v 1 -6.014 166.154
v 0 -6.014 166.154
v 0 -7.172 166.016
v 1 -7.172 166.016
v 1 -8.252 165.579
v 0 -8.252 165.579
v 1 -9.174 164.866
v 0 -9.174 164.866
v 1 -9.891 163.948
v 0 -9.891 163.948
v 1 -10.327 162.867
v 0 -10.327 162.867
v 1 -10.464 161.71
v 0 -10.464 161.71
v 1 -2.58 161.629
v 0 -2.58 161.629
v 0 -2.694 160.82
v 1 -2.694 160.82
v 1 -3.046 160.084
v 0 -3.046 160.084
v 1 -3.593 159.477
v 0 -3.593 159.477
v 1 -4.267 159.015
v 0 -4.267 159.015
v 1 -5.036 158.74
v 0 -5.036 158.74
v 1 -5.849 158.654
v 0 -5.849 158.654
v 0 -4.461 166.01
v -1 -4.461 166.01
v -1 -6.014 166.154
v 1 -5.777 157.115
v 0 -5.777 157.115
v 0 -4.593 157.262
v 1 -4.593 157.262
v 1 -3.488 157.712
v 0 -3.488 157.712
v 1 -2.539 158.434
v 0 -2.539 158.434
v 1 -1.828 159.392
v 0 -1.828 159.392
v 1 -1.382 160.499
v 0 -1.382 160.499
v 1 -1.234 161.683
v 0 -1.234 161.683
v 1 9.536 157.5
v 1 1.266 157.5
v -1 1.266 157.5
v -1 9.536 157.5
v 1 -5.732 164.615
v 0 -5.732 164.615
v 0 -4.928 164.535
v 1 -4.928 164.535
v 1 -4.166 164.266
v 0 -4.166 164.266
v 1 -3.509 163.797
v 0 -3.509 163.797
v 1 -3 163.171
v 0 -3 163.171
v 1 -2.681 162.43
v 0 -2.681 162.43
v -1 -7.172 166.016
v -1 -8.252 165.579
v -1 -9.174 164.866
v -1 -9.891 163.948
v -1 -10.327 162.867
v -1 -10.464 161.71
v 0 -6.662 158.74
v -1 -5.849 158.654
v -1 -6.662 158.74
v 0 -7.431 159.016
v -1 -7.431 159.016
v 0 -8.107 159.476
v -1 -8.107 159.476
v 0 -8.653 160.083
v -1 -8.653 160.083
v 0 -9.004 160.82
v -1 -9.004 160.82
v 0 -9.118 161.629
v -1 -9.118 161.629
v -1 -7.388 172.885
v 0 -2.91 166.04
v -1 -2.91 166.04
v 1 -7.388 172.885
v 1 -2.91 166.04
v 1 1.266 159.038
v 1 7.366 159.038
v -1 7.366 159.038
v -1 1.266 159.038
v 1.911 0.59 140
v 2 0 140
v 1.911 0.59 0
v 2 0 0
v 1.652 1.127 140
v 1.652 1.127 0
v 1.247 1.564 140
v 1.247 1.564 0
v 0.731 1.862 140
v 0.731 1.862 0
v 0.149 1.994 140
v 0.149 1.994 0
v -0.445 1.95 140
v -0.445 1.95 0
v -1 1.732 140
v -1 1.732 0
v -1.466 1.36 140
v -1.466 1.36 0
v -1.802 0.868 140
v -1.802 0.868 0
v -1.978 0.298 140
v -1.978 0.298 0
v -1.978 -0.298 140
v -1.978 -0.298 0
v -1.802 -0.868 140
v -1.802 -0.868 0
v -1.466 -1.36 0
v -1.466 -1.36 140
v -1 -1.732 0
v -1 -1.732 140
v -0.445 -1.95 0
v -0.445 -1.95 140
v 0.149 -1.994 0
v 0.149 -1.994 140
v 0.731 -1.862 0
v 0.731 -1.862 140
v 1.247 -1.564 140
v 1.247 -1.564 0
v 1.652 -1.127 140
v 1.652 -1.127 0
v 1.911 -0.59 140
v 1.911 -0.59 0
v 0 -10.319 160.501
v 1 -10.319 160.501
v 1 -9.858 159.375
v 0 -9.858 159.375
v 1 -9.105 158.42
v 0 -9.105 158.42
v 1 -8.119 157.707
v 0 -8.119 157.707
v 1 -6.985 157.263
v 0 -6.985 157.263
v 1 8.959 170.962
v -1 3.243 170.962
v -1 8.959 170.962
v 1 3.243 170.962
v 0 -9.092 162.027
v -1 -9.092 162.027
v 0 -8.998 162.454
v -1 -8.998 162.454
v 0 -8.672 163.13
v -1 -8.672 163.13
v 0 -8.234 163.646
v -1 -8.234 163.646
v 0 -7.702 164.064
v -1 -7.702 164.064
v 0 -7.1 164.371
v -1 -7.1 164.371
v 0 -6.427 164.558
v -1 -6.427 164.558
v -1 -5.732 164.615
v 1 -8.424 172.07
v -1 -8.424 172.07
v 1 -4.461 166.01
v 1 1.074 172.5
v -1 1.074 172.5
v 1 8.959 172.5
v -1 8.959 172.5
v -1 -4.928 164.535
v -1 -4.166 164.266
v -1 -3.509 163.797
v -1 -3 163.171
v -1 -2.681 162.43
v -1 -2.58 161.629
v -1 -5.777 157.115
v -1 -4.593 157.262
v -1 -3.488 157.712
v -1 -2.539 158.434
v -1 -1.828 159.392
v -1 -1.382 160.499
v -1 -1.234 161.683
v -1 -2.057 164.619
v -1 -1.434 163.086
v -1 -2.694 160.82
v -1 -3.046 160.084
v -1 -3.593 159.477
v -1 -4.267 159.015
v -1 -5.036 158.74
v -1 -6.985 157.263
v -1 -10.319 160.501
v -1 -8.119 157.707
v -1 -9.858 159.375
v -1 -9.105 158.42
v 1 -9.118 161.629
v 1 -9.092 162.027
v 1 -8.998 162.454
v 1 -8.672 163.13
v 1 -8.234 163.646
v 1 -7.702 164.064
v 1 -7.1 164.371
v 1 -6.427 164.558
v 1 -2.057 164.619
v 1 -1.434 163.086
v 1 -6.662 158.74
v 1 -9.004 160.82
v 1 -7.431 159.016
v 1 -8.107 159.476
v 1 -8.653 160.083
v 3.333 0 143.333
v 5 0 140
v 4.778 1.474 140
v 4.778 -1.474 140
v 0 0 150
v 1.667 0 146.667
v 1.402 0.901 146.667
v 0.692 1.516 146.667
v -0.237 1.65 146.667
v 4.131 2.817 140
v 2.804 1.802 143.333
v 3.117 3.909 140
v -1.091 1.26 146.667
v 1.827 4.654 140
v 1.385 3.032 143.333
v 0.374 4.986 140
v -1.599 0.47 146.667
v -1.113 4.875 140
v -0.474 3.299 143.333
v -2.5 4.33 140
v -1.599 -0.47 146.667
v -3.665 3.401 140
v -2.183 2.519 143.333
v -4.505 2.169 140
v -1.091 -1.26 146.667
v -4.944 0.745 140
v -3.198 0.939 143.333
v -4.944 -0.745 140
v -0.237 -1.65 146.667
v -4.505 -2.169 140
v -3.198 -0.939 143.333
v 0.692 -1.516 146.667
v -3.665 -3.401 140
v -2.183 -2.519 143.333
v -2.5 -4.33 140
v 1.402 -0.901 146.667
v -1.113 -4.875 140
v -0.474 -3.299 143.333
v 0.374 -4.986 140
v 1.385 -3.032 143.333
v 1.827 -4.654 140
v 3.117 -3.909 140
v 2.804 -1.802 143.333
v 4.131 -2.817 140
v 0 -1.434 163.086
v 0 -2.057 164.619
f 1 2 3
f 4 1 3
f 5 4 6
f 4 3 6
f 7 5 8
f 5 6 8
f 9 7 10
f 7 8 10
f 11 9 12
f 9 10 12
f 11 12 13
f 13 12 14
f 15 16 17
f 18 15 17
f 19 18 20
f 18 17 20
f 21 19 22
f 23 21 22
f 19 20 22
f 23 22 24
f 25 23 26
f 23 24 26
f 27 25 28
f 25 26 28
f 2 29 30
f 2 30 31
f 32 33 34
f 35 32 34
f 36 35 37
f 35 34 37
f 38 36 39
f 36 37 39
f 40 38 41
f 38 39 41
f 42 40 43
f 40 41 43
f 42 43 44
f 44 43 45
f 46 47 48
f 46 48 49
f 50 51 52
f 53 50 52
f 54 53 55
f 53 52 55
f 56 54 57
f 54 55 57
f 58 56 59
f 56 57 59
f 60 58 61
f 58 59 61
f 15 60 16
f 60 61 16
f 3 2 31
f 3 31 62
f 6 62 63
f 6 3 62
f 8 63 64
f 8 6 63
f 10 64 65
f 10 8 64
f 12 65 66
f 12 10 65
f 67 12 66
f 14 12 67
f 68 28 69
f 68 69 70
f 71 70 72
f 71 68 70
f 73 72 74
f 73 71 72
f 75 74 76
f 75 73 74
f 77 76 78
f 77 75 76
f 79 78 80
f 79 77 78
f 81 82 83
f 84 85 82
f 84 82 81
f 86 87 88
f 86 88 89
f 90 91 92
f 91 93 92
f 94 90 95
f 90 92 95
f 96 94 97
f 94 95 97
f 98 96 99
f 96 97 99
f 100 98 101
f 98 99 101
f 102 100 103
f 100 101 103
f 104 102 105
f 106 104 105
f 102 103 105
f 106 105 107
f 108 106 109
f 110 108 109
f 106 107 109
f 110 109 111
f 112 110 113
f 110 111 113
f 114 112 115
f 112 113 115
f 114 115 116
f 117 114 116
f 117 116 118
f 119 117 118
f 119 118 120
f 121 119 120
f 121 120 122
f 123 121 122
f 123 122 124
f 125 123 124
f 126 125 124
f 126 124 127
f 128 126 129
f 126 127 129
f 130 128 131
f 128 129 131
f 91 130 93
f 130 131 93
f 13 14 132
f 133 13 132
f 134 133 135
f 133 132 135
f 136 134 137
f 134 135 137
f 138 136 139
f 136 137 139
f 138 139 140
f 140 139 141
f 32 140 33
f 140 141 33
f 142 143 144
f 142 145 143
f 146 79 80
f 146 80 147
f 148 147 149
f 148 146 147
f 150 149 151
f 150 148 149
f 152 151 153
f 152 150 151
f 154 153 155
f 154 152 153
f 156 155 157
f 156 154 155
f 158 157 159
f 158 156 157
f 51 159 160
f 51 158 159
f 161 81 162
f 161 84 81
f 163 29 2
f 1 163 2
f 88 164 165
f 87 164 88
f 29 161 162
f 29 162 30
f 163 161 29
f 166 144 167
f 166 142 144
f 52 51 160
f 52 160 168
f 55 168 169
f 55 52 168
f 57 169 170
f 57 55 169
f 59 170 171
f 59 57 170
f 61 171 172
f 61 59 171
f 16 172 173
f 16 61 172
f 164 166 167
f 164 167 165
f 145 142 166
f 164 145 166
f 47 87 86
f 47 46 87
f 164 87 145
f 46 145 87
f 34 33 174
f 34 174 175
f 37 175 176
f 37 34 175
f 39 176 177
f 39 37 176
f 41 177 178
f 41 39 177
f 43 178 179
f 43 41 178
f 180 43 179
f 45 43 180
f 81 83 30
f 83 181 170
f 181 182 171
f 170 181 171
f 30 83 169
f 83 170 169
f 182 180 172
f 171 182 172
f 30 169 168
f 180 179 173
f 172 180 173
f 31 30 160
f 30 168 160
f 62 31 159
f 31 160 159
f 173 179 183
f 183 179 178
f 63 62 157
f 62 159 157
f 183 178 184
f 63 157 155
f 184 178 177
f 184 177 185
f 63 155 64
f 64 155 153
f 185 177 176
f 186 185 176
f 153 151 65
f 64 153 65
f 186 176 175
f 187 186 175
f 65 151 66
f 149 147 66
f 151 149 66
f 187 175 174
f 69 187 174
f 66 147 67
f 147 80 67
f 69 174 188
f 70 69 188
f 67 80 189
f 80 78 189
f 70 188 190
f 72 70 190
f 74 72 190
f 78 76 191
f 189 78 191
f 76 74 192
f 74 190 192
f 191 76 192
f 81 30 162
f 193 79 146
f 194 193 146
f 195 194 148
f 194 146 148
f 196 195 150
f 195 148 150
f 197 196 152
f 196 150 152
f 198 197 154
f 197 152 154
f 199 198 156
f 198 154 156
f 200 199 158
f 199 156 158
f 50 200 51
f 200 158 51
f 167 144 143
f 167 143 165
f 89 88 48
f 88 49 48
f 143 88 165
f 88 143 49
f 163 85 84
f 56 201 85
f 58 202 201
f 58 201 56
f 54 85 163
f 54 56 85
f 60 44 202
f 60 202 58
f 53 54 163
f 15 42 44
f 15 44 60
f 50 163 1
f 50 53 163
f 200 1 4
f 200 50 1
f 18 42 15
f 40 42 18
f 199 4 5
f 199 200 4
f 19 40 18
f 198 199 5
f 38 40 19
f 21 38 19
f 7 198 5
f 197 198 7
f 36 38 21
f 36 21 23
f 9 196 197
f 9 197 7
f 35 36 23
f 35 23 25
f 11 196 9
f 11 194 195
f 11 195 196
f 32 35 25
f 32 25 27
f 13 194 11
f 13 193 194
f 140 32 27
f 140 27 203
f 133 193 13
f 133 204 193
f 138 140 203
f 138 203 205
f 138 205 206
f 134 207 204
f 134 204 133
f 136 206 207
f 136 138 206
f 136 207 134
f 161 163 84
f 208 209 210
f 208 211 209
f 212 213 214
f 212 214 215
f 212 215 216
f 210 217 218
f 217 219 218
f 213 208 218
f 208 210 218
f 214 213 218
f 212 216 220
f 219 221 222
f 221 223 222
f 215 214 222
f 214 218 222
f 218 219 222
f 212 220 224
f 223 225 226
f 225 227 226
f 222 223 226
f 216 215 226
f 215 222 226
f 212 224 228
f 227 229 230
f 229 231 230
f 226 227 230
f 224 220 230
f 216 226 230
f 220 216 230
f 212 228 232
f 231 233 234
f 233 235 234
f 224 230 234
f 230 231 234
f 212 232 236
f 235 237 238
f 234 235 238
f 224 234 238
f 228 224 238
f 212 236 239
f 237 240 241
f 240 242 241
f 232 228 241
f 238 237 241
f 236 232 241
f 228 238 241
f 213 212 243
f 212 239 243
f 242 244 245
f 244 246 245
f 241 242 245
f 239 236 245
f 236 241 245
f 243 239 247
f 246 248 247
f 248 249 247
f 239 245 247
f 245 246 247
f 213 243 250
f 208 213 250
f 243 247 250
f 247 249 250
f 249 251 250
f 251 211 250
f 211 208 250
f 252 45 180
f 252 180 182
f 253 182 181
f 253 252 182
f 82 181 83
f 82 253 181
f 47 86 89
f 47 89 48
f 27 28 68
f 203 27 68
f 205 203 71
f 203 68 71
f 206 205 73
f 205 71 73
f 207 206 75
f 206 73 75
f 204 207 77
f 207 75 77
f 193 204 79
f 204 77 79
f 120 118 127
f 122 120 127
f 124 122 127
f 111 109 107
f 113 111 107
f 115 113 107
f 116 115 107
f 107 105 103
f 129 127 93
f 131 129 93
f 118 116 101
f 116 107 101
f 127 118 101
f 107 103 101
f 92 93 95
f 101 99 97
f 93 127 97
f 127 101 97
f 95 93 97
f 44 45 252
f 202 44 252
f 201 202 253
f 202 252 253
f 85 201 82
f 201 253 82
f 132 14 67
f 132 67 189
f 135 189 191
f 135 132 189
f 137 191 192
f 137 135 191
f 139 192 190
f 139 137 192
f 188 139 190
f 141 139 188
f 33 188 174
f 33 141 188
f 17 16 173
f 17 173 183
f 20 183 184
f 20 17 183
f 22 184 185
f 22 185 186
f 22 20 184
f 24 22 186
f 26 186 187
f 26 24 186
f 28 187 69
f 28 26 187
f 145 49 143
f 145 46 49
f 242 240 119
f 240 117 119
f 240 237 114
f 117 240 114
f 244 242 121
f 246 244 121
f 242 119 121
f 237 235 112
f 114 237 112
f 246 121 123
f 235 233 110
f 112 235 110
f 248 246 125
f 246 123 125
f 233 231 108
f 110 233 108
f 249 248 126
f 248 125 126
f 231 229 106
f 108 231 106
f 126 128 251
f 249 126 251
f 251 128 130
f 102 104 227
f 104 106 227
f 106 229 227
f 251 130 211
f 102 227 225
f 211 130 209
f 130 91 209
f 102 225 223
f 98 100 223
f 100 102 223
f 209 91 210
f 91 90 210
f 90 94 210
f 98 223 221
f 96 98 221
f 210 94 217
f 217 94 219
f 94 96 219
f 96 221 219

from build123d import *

# Parameters (mm, degrees)
BOSS_EXTRUDE1_DEPTH        = 1
BOSS_EXTRUDE1_DEPTH_BACK   = 1
BOSS_EXTRUDE1_2_DEPTH      = 1
BOSS_EXTRUDE1_2_DEPTH_BACK = 1


with BuildPart() as part:
    # Sketch2 → Revolve1 (revolve)
    with BuildSketch(Plane(origin=(0, 0, 0), x_dir=(1, 0, 0), z_dir=(0, 1, 0))):
        Polygon((0, -150), (5, -140), (2, -140), (2, 0), (0, 0), align=None)
    revolve(axis=Axis((0, 0, -41.949952025), (0, 0, 1)))


with BuildPart() as body_2:
    # Sketch3 → Boss-Extrude1 (new, two sides: drawn at the far end of the back side and taken through both)
    with BuildSketch(Plane(origin=(0, 0, 0), x_dir=(0, -1, 0), z_dir=(1, 0, 0)).offset(-BOSS_EXTRUDE1_DEPTH_BACK)):
        Polygon((-8.958586521, -170.961538462), (-8.958586521, -172.5), (-1.073971137, -172.5), (-7.366038444, -159.038461538), (-1.266278829, -159.038461538), (-1.266278829, -157.5), (-9.535509598, -157.5), (-3.243442291, -170.961538462), align=None)
    extrude(amount=BOSS_EXTRUDE1_DEPTH + BOSS_EXTRUDE1_DEPTH_BACK)


with BuildPart() as body_3:
    # Sketch3 → Boss-Extrude1 2 (new, two sides: drawn at the far end of the back side and taken through both)
    with BuildSketch(Plane(origin=(0, 0, 0), x_dir=(0, -1, 0), z_dir=(1, 0, 0)).offset(-BOSS_EXTRUDE1_2_DEPTH_BACK)):
        with BuildLine():
            Line((7.387567325, -172.884615385), (8.424225979, -172.0703125))
            Line((8.424225979, -172.0703125), (4.460884633, -166.009615385))
            add(Edge.make_bspline(
                [(4.460884633, -166.009615385), (4.724757248, -166.051674787), (5.23947062, -166.133716408), (5.760467328, -166.14725046), (6.014370209, -166.153846154)],
                knots=[0, 0, 0, 0, 1.025318673, 2, 2, 2, 2], degree=3))
            add(Edge.make_bspline(
                [(6.014370209, -166.153846154), (6.166823765, -166.149748532), (6.466924054, -166.141682487), (6.90752463, -166.079608839), (7.330905801, -165.981786938), (7.73531265, -165.839191529), (8.122197082, -165.657038681), (8.493777932, -165.43872886), (8.843075506, -165.17299167), (9.174568059, -164.876136314), (9.475587859, -164.547369878), (9.741888404, -164.198432357), (9.96680146, -163.829351346), (10.14599094, -163.440209844), (10.289195068, -163.034053996), (10.391138976, -162.609299766), (10.452082579, -162.165230263), (10.460310746, -161.863171943), (10.464490402, -161.709735577)],
                knots=[0, 0, 0, 0, 1.043709831, 2.054511743, 3.041122595, 4.01515914, 4.98481438, 5.965901842, 6.960491961, 7.985277438, 9.0096037, 10.00832444, 10.987059228, 11.962929573, 12.936966118, 13.931840027, 14.949438142, 16, 16, 16, 16], degree=3))
            add(Edge.make_bspline(
                [(10.464490402, -161.709735577), (10.45667713, -161.499939569), (10.441311524, -161.08735409), (10.329035926, -160.484047587), (10.136701892, -159.914243011), (9.875246254, -159.376452548), (9.542487381, -158.881938665), (9.143368233, -158.436516889), (8.679859323, -158.048269515), (8.161189367, -157.715354194), (7.599903237, -157.450815338), (7.011356352, -157.255246112), (6.40060363, -157.138386318), (5.985817631, -157.123087117), (5.776990402, -157.115384615)],
                knots=[0, 0, 0, 0, 1.0319111, 2.029359566, 3.00642934, 3.98275322, 4.962714161, 5.929339302, 6.915525103, 7.928435063, 8.953439721, 9.960121214, 10.9730072, 12, 12, 12, 12], degree=3))
            add(Edge.make_bspline(
                [(5.776990402, -157.115384615), (5.575138865, -157.12191544), (5.175306311, -157.13485186), (4.587290587, -157.250692626), (4.021275897, -157.437113987), (3.484540848, -157.699332813), (2.986473856, -158.024936501), (2.537456198, -158.414250968), (2.148849642, -158.867528729), (1.824265766, -159.376311485), (1.558647205, -159.918720222), (1.3730556, -160.490451538), (1.252389216, -161.079656481), (1.239971685, -161.480781294), (1.233721171, -161.682692308)],
                knots=[0, 0, 0, 0, 1.01206923, 2.004731945, 2.994948482, 3.995280086, 4.993424783, 5.973125358, 6.967517142, 7.97830003, 8.994392566, 9.989381197, 10.98793077, 12, 12, 12, 12], degree=3))
            add(Edge.make_bspline(
                [(1.233721171, -161.682692308), (1.239157378, -161.837112847), (1.250252135, -162.152269778), (1.316464364, -162.630964519), (1.437905683, -163.118852651), (1.569331733, -163.532448307), (1.699746048, -163.874980445), (1.820669201, -164.145469026), (1.95587602, -164.431113653), (2.114357241, -164.726509648), (2.282360125, -165.040097115), (2.478606559, -165.360262952), (2.683392728, -165.698700605), (2.833413854, -165.924027137), (2.910403863, -166.039663462)],
                knots=[0, 0, 0, 0, 1.17367173, 2.395347028, 3.66355231, 4.98980831, 5.690886799, 6.447442954, 7.240630024, 8.091733897, 8.994365608, 9.943299771, 10.944512865, 12, 12, 12, 12], degree=3))
            Line((2.910403863, -166.039663462), (7.387567325, -172.884615385))
        make_face()
        with BuildLine():
            add(Edge.make_bspline(
                [(5.731918286, -164.615384615), (5.617643803, -164.612038432), (5.393438208, -164.605473249), (5.065103103, -164.567575452), (4.754169296, -164.498211914), (4.461147017, -164.400575861), (4.181711815, -164.281289821), (3.920302291, -164.13002039), (3.675159154, -163.952130825), (3.451943564, -163.747382358), (3.246922766, -163.526633888), (3.070584936, -163.288737062), (2.918306509, -163.041006028), (2.794537717, -162.781100358), (2.698148876, -162.509189913), (2.628428562, -162.226506566), (2.589626566, -161.931159769), (2.583171317, -161.730877583), (2.579875017, -161.628605769)],
                knots=[0, 0, 0, 0, 1.129540697, 2.216149546, 3.260829642, 4.271906843, 5.264942922, 6.258225651, 7.250175744, 8.252297429, 9.247108021, 10.223125336, 11.173816288, 12.116901384, 13.062424938, 14.020354563, 14.989116641, 16, 16, 16, 16], degree=3))
            add(Edge.make_bspline(
                [(2.579875017, -161.628605769), (2.582661394, -161.527270268), (2.588152291, -161.327576232), (2.634686617, -161.034379419), (2.709592422, -160.753131579), (2.816076551, -160.483239431), (2.952112837, -160.225113333), (3.114819392, -159.975632853), (3.312115114, -159.741438867), (3.5362472, -159.521085993), (3.779792579, -159.319445103), (4.036823461, -159.139166208), (4.308262109, -158.989531157), (4.591217774, -158.864457508), (4.889245249, -158.772569713), (5.197297603, -158.702173196), (5.519619865, -158.663697577), (5.737835651, -158.657173061), (5.849105786, -158.653846154)],
                knots=[0, 0, 0, 0, 0.98953633, 1.950002717, 2.892353065, 3.828177645, 4.777967117, 5.738732544, 6.732276577, 7.76327951, 8.805689376, 9.818183401, 10.825652611, 11.829169732, 12.834974292, 13.867693979, 14.912718532, 16, 16, 16, 16], degree=3))
            add(Edge.make_bspline(
                [(5.849105786, -158.653846154), (5.960376104, -158.657172802), (6.178592248, -158.66369681), (6.500911916, -158.702176111), (6.808973852, -158.772559029), (7.106966521, -158.864496219), (7.390051273, -158.989386675), (7.661727396, -159.140109433), (7.92121244, -159.318352216), (8.164599428, -159.521434681), (8.389666859, -159.740188862), (8.582429019, -159.97777361), (8.750382815, -160.223149948), (8.88123106, -160.484266134), (8.988907437, -160.752971083), (9.063446275, -161.034423223), (9.110079809, -161.327564804), (9.115557089, -161.527266421), (9.118336556, -161.628605769)],
                knots=[0, 0, 0, 0, 1.087095469, 2.131941252, 3.164484274, 4.170116773, 5.173462224, 6.180759088, 7.201132453, 8.243363996, 9.274190558, 10.261329848, 11.227346438, 12.172477233, 13.108141724, 14.050330866, 15.010632948, 16, 16, 16, 16], degree=3))
            add(Edge.make_bspline(
                [(9.118336556, -161.628605769), (9.116005645, -161.731022874), (9.111430827, -161.932034344), (9.058685072, -162.22624047), (8.987443172, -162.511488594), (8.872309656, -162.781352824), (8.735176504, -163.043296813), (8.560476842, -163.289830887), (8.360183356, -163.527951683), (8.1282086, -163.748845574), (7.8758991, -163.951035701), (7.607372218, -164.128979892), (7.327575224, -164.280878587), (7.032553285, -164.400737488), (6.726279448, -164.497297507), (6.406637889, -164.567110851), (6.073401532, -164.605532255), (5.847195868, -164.612058665), (5.731918286, -164.615384615)],
                knots=[0, 0, 0, 0, 0.978317929, 1.920119929, 2.851929572, 3.784133089, 4.71845084, 5.67514162, 6.667477147, 7.690549442, 8.733345855, 9.756283585, 10.767808623, 11.772962645, 12.797066014, 13.836159554, 14.89727653, 16, 16, 16, 16], degree=3))
        make_face(mode=Mode.SUBTRACT)
    extrude(amount=BOSS_EXTRUDE1_2_DEPTH + BOSS_EXTRUDE1_2_DEPTH_BACK)


solid = Compound([part.part, body_2.part, body_3.part])
